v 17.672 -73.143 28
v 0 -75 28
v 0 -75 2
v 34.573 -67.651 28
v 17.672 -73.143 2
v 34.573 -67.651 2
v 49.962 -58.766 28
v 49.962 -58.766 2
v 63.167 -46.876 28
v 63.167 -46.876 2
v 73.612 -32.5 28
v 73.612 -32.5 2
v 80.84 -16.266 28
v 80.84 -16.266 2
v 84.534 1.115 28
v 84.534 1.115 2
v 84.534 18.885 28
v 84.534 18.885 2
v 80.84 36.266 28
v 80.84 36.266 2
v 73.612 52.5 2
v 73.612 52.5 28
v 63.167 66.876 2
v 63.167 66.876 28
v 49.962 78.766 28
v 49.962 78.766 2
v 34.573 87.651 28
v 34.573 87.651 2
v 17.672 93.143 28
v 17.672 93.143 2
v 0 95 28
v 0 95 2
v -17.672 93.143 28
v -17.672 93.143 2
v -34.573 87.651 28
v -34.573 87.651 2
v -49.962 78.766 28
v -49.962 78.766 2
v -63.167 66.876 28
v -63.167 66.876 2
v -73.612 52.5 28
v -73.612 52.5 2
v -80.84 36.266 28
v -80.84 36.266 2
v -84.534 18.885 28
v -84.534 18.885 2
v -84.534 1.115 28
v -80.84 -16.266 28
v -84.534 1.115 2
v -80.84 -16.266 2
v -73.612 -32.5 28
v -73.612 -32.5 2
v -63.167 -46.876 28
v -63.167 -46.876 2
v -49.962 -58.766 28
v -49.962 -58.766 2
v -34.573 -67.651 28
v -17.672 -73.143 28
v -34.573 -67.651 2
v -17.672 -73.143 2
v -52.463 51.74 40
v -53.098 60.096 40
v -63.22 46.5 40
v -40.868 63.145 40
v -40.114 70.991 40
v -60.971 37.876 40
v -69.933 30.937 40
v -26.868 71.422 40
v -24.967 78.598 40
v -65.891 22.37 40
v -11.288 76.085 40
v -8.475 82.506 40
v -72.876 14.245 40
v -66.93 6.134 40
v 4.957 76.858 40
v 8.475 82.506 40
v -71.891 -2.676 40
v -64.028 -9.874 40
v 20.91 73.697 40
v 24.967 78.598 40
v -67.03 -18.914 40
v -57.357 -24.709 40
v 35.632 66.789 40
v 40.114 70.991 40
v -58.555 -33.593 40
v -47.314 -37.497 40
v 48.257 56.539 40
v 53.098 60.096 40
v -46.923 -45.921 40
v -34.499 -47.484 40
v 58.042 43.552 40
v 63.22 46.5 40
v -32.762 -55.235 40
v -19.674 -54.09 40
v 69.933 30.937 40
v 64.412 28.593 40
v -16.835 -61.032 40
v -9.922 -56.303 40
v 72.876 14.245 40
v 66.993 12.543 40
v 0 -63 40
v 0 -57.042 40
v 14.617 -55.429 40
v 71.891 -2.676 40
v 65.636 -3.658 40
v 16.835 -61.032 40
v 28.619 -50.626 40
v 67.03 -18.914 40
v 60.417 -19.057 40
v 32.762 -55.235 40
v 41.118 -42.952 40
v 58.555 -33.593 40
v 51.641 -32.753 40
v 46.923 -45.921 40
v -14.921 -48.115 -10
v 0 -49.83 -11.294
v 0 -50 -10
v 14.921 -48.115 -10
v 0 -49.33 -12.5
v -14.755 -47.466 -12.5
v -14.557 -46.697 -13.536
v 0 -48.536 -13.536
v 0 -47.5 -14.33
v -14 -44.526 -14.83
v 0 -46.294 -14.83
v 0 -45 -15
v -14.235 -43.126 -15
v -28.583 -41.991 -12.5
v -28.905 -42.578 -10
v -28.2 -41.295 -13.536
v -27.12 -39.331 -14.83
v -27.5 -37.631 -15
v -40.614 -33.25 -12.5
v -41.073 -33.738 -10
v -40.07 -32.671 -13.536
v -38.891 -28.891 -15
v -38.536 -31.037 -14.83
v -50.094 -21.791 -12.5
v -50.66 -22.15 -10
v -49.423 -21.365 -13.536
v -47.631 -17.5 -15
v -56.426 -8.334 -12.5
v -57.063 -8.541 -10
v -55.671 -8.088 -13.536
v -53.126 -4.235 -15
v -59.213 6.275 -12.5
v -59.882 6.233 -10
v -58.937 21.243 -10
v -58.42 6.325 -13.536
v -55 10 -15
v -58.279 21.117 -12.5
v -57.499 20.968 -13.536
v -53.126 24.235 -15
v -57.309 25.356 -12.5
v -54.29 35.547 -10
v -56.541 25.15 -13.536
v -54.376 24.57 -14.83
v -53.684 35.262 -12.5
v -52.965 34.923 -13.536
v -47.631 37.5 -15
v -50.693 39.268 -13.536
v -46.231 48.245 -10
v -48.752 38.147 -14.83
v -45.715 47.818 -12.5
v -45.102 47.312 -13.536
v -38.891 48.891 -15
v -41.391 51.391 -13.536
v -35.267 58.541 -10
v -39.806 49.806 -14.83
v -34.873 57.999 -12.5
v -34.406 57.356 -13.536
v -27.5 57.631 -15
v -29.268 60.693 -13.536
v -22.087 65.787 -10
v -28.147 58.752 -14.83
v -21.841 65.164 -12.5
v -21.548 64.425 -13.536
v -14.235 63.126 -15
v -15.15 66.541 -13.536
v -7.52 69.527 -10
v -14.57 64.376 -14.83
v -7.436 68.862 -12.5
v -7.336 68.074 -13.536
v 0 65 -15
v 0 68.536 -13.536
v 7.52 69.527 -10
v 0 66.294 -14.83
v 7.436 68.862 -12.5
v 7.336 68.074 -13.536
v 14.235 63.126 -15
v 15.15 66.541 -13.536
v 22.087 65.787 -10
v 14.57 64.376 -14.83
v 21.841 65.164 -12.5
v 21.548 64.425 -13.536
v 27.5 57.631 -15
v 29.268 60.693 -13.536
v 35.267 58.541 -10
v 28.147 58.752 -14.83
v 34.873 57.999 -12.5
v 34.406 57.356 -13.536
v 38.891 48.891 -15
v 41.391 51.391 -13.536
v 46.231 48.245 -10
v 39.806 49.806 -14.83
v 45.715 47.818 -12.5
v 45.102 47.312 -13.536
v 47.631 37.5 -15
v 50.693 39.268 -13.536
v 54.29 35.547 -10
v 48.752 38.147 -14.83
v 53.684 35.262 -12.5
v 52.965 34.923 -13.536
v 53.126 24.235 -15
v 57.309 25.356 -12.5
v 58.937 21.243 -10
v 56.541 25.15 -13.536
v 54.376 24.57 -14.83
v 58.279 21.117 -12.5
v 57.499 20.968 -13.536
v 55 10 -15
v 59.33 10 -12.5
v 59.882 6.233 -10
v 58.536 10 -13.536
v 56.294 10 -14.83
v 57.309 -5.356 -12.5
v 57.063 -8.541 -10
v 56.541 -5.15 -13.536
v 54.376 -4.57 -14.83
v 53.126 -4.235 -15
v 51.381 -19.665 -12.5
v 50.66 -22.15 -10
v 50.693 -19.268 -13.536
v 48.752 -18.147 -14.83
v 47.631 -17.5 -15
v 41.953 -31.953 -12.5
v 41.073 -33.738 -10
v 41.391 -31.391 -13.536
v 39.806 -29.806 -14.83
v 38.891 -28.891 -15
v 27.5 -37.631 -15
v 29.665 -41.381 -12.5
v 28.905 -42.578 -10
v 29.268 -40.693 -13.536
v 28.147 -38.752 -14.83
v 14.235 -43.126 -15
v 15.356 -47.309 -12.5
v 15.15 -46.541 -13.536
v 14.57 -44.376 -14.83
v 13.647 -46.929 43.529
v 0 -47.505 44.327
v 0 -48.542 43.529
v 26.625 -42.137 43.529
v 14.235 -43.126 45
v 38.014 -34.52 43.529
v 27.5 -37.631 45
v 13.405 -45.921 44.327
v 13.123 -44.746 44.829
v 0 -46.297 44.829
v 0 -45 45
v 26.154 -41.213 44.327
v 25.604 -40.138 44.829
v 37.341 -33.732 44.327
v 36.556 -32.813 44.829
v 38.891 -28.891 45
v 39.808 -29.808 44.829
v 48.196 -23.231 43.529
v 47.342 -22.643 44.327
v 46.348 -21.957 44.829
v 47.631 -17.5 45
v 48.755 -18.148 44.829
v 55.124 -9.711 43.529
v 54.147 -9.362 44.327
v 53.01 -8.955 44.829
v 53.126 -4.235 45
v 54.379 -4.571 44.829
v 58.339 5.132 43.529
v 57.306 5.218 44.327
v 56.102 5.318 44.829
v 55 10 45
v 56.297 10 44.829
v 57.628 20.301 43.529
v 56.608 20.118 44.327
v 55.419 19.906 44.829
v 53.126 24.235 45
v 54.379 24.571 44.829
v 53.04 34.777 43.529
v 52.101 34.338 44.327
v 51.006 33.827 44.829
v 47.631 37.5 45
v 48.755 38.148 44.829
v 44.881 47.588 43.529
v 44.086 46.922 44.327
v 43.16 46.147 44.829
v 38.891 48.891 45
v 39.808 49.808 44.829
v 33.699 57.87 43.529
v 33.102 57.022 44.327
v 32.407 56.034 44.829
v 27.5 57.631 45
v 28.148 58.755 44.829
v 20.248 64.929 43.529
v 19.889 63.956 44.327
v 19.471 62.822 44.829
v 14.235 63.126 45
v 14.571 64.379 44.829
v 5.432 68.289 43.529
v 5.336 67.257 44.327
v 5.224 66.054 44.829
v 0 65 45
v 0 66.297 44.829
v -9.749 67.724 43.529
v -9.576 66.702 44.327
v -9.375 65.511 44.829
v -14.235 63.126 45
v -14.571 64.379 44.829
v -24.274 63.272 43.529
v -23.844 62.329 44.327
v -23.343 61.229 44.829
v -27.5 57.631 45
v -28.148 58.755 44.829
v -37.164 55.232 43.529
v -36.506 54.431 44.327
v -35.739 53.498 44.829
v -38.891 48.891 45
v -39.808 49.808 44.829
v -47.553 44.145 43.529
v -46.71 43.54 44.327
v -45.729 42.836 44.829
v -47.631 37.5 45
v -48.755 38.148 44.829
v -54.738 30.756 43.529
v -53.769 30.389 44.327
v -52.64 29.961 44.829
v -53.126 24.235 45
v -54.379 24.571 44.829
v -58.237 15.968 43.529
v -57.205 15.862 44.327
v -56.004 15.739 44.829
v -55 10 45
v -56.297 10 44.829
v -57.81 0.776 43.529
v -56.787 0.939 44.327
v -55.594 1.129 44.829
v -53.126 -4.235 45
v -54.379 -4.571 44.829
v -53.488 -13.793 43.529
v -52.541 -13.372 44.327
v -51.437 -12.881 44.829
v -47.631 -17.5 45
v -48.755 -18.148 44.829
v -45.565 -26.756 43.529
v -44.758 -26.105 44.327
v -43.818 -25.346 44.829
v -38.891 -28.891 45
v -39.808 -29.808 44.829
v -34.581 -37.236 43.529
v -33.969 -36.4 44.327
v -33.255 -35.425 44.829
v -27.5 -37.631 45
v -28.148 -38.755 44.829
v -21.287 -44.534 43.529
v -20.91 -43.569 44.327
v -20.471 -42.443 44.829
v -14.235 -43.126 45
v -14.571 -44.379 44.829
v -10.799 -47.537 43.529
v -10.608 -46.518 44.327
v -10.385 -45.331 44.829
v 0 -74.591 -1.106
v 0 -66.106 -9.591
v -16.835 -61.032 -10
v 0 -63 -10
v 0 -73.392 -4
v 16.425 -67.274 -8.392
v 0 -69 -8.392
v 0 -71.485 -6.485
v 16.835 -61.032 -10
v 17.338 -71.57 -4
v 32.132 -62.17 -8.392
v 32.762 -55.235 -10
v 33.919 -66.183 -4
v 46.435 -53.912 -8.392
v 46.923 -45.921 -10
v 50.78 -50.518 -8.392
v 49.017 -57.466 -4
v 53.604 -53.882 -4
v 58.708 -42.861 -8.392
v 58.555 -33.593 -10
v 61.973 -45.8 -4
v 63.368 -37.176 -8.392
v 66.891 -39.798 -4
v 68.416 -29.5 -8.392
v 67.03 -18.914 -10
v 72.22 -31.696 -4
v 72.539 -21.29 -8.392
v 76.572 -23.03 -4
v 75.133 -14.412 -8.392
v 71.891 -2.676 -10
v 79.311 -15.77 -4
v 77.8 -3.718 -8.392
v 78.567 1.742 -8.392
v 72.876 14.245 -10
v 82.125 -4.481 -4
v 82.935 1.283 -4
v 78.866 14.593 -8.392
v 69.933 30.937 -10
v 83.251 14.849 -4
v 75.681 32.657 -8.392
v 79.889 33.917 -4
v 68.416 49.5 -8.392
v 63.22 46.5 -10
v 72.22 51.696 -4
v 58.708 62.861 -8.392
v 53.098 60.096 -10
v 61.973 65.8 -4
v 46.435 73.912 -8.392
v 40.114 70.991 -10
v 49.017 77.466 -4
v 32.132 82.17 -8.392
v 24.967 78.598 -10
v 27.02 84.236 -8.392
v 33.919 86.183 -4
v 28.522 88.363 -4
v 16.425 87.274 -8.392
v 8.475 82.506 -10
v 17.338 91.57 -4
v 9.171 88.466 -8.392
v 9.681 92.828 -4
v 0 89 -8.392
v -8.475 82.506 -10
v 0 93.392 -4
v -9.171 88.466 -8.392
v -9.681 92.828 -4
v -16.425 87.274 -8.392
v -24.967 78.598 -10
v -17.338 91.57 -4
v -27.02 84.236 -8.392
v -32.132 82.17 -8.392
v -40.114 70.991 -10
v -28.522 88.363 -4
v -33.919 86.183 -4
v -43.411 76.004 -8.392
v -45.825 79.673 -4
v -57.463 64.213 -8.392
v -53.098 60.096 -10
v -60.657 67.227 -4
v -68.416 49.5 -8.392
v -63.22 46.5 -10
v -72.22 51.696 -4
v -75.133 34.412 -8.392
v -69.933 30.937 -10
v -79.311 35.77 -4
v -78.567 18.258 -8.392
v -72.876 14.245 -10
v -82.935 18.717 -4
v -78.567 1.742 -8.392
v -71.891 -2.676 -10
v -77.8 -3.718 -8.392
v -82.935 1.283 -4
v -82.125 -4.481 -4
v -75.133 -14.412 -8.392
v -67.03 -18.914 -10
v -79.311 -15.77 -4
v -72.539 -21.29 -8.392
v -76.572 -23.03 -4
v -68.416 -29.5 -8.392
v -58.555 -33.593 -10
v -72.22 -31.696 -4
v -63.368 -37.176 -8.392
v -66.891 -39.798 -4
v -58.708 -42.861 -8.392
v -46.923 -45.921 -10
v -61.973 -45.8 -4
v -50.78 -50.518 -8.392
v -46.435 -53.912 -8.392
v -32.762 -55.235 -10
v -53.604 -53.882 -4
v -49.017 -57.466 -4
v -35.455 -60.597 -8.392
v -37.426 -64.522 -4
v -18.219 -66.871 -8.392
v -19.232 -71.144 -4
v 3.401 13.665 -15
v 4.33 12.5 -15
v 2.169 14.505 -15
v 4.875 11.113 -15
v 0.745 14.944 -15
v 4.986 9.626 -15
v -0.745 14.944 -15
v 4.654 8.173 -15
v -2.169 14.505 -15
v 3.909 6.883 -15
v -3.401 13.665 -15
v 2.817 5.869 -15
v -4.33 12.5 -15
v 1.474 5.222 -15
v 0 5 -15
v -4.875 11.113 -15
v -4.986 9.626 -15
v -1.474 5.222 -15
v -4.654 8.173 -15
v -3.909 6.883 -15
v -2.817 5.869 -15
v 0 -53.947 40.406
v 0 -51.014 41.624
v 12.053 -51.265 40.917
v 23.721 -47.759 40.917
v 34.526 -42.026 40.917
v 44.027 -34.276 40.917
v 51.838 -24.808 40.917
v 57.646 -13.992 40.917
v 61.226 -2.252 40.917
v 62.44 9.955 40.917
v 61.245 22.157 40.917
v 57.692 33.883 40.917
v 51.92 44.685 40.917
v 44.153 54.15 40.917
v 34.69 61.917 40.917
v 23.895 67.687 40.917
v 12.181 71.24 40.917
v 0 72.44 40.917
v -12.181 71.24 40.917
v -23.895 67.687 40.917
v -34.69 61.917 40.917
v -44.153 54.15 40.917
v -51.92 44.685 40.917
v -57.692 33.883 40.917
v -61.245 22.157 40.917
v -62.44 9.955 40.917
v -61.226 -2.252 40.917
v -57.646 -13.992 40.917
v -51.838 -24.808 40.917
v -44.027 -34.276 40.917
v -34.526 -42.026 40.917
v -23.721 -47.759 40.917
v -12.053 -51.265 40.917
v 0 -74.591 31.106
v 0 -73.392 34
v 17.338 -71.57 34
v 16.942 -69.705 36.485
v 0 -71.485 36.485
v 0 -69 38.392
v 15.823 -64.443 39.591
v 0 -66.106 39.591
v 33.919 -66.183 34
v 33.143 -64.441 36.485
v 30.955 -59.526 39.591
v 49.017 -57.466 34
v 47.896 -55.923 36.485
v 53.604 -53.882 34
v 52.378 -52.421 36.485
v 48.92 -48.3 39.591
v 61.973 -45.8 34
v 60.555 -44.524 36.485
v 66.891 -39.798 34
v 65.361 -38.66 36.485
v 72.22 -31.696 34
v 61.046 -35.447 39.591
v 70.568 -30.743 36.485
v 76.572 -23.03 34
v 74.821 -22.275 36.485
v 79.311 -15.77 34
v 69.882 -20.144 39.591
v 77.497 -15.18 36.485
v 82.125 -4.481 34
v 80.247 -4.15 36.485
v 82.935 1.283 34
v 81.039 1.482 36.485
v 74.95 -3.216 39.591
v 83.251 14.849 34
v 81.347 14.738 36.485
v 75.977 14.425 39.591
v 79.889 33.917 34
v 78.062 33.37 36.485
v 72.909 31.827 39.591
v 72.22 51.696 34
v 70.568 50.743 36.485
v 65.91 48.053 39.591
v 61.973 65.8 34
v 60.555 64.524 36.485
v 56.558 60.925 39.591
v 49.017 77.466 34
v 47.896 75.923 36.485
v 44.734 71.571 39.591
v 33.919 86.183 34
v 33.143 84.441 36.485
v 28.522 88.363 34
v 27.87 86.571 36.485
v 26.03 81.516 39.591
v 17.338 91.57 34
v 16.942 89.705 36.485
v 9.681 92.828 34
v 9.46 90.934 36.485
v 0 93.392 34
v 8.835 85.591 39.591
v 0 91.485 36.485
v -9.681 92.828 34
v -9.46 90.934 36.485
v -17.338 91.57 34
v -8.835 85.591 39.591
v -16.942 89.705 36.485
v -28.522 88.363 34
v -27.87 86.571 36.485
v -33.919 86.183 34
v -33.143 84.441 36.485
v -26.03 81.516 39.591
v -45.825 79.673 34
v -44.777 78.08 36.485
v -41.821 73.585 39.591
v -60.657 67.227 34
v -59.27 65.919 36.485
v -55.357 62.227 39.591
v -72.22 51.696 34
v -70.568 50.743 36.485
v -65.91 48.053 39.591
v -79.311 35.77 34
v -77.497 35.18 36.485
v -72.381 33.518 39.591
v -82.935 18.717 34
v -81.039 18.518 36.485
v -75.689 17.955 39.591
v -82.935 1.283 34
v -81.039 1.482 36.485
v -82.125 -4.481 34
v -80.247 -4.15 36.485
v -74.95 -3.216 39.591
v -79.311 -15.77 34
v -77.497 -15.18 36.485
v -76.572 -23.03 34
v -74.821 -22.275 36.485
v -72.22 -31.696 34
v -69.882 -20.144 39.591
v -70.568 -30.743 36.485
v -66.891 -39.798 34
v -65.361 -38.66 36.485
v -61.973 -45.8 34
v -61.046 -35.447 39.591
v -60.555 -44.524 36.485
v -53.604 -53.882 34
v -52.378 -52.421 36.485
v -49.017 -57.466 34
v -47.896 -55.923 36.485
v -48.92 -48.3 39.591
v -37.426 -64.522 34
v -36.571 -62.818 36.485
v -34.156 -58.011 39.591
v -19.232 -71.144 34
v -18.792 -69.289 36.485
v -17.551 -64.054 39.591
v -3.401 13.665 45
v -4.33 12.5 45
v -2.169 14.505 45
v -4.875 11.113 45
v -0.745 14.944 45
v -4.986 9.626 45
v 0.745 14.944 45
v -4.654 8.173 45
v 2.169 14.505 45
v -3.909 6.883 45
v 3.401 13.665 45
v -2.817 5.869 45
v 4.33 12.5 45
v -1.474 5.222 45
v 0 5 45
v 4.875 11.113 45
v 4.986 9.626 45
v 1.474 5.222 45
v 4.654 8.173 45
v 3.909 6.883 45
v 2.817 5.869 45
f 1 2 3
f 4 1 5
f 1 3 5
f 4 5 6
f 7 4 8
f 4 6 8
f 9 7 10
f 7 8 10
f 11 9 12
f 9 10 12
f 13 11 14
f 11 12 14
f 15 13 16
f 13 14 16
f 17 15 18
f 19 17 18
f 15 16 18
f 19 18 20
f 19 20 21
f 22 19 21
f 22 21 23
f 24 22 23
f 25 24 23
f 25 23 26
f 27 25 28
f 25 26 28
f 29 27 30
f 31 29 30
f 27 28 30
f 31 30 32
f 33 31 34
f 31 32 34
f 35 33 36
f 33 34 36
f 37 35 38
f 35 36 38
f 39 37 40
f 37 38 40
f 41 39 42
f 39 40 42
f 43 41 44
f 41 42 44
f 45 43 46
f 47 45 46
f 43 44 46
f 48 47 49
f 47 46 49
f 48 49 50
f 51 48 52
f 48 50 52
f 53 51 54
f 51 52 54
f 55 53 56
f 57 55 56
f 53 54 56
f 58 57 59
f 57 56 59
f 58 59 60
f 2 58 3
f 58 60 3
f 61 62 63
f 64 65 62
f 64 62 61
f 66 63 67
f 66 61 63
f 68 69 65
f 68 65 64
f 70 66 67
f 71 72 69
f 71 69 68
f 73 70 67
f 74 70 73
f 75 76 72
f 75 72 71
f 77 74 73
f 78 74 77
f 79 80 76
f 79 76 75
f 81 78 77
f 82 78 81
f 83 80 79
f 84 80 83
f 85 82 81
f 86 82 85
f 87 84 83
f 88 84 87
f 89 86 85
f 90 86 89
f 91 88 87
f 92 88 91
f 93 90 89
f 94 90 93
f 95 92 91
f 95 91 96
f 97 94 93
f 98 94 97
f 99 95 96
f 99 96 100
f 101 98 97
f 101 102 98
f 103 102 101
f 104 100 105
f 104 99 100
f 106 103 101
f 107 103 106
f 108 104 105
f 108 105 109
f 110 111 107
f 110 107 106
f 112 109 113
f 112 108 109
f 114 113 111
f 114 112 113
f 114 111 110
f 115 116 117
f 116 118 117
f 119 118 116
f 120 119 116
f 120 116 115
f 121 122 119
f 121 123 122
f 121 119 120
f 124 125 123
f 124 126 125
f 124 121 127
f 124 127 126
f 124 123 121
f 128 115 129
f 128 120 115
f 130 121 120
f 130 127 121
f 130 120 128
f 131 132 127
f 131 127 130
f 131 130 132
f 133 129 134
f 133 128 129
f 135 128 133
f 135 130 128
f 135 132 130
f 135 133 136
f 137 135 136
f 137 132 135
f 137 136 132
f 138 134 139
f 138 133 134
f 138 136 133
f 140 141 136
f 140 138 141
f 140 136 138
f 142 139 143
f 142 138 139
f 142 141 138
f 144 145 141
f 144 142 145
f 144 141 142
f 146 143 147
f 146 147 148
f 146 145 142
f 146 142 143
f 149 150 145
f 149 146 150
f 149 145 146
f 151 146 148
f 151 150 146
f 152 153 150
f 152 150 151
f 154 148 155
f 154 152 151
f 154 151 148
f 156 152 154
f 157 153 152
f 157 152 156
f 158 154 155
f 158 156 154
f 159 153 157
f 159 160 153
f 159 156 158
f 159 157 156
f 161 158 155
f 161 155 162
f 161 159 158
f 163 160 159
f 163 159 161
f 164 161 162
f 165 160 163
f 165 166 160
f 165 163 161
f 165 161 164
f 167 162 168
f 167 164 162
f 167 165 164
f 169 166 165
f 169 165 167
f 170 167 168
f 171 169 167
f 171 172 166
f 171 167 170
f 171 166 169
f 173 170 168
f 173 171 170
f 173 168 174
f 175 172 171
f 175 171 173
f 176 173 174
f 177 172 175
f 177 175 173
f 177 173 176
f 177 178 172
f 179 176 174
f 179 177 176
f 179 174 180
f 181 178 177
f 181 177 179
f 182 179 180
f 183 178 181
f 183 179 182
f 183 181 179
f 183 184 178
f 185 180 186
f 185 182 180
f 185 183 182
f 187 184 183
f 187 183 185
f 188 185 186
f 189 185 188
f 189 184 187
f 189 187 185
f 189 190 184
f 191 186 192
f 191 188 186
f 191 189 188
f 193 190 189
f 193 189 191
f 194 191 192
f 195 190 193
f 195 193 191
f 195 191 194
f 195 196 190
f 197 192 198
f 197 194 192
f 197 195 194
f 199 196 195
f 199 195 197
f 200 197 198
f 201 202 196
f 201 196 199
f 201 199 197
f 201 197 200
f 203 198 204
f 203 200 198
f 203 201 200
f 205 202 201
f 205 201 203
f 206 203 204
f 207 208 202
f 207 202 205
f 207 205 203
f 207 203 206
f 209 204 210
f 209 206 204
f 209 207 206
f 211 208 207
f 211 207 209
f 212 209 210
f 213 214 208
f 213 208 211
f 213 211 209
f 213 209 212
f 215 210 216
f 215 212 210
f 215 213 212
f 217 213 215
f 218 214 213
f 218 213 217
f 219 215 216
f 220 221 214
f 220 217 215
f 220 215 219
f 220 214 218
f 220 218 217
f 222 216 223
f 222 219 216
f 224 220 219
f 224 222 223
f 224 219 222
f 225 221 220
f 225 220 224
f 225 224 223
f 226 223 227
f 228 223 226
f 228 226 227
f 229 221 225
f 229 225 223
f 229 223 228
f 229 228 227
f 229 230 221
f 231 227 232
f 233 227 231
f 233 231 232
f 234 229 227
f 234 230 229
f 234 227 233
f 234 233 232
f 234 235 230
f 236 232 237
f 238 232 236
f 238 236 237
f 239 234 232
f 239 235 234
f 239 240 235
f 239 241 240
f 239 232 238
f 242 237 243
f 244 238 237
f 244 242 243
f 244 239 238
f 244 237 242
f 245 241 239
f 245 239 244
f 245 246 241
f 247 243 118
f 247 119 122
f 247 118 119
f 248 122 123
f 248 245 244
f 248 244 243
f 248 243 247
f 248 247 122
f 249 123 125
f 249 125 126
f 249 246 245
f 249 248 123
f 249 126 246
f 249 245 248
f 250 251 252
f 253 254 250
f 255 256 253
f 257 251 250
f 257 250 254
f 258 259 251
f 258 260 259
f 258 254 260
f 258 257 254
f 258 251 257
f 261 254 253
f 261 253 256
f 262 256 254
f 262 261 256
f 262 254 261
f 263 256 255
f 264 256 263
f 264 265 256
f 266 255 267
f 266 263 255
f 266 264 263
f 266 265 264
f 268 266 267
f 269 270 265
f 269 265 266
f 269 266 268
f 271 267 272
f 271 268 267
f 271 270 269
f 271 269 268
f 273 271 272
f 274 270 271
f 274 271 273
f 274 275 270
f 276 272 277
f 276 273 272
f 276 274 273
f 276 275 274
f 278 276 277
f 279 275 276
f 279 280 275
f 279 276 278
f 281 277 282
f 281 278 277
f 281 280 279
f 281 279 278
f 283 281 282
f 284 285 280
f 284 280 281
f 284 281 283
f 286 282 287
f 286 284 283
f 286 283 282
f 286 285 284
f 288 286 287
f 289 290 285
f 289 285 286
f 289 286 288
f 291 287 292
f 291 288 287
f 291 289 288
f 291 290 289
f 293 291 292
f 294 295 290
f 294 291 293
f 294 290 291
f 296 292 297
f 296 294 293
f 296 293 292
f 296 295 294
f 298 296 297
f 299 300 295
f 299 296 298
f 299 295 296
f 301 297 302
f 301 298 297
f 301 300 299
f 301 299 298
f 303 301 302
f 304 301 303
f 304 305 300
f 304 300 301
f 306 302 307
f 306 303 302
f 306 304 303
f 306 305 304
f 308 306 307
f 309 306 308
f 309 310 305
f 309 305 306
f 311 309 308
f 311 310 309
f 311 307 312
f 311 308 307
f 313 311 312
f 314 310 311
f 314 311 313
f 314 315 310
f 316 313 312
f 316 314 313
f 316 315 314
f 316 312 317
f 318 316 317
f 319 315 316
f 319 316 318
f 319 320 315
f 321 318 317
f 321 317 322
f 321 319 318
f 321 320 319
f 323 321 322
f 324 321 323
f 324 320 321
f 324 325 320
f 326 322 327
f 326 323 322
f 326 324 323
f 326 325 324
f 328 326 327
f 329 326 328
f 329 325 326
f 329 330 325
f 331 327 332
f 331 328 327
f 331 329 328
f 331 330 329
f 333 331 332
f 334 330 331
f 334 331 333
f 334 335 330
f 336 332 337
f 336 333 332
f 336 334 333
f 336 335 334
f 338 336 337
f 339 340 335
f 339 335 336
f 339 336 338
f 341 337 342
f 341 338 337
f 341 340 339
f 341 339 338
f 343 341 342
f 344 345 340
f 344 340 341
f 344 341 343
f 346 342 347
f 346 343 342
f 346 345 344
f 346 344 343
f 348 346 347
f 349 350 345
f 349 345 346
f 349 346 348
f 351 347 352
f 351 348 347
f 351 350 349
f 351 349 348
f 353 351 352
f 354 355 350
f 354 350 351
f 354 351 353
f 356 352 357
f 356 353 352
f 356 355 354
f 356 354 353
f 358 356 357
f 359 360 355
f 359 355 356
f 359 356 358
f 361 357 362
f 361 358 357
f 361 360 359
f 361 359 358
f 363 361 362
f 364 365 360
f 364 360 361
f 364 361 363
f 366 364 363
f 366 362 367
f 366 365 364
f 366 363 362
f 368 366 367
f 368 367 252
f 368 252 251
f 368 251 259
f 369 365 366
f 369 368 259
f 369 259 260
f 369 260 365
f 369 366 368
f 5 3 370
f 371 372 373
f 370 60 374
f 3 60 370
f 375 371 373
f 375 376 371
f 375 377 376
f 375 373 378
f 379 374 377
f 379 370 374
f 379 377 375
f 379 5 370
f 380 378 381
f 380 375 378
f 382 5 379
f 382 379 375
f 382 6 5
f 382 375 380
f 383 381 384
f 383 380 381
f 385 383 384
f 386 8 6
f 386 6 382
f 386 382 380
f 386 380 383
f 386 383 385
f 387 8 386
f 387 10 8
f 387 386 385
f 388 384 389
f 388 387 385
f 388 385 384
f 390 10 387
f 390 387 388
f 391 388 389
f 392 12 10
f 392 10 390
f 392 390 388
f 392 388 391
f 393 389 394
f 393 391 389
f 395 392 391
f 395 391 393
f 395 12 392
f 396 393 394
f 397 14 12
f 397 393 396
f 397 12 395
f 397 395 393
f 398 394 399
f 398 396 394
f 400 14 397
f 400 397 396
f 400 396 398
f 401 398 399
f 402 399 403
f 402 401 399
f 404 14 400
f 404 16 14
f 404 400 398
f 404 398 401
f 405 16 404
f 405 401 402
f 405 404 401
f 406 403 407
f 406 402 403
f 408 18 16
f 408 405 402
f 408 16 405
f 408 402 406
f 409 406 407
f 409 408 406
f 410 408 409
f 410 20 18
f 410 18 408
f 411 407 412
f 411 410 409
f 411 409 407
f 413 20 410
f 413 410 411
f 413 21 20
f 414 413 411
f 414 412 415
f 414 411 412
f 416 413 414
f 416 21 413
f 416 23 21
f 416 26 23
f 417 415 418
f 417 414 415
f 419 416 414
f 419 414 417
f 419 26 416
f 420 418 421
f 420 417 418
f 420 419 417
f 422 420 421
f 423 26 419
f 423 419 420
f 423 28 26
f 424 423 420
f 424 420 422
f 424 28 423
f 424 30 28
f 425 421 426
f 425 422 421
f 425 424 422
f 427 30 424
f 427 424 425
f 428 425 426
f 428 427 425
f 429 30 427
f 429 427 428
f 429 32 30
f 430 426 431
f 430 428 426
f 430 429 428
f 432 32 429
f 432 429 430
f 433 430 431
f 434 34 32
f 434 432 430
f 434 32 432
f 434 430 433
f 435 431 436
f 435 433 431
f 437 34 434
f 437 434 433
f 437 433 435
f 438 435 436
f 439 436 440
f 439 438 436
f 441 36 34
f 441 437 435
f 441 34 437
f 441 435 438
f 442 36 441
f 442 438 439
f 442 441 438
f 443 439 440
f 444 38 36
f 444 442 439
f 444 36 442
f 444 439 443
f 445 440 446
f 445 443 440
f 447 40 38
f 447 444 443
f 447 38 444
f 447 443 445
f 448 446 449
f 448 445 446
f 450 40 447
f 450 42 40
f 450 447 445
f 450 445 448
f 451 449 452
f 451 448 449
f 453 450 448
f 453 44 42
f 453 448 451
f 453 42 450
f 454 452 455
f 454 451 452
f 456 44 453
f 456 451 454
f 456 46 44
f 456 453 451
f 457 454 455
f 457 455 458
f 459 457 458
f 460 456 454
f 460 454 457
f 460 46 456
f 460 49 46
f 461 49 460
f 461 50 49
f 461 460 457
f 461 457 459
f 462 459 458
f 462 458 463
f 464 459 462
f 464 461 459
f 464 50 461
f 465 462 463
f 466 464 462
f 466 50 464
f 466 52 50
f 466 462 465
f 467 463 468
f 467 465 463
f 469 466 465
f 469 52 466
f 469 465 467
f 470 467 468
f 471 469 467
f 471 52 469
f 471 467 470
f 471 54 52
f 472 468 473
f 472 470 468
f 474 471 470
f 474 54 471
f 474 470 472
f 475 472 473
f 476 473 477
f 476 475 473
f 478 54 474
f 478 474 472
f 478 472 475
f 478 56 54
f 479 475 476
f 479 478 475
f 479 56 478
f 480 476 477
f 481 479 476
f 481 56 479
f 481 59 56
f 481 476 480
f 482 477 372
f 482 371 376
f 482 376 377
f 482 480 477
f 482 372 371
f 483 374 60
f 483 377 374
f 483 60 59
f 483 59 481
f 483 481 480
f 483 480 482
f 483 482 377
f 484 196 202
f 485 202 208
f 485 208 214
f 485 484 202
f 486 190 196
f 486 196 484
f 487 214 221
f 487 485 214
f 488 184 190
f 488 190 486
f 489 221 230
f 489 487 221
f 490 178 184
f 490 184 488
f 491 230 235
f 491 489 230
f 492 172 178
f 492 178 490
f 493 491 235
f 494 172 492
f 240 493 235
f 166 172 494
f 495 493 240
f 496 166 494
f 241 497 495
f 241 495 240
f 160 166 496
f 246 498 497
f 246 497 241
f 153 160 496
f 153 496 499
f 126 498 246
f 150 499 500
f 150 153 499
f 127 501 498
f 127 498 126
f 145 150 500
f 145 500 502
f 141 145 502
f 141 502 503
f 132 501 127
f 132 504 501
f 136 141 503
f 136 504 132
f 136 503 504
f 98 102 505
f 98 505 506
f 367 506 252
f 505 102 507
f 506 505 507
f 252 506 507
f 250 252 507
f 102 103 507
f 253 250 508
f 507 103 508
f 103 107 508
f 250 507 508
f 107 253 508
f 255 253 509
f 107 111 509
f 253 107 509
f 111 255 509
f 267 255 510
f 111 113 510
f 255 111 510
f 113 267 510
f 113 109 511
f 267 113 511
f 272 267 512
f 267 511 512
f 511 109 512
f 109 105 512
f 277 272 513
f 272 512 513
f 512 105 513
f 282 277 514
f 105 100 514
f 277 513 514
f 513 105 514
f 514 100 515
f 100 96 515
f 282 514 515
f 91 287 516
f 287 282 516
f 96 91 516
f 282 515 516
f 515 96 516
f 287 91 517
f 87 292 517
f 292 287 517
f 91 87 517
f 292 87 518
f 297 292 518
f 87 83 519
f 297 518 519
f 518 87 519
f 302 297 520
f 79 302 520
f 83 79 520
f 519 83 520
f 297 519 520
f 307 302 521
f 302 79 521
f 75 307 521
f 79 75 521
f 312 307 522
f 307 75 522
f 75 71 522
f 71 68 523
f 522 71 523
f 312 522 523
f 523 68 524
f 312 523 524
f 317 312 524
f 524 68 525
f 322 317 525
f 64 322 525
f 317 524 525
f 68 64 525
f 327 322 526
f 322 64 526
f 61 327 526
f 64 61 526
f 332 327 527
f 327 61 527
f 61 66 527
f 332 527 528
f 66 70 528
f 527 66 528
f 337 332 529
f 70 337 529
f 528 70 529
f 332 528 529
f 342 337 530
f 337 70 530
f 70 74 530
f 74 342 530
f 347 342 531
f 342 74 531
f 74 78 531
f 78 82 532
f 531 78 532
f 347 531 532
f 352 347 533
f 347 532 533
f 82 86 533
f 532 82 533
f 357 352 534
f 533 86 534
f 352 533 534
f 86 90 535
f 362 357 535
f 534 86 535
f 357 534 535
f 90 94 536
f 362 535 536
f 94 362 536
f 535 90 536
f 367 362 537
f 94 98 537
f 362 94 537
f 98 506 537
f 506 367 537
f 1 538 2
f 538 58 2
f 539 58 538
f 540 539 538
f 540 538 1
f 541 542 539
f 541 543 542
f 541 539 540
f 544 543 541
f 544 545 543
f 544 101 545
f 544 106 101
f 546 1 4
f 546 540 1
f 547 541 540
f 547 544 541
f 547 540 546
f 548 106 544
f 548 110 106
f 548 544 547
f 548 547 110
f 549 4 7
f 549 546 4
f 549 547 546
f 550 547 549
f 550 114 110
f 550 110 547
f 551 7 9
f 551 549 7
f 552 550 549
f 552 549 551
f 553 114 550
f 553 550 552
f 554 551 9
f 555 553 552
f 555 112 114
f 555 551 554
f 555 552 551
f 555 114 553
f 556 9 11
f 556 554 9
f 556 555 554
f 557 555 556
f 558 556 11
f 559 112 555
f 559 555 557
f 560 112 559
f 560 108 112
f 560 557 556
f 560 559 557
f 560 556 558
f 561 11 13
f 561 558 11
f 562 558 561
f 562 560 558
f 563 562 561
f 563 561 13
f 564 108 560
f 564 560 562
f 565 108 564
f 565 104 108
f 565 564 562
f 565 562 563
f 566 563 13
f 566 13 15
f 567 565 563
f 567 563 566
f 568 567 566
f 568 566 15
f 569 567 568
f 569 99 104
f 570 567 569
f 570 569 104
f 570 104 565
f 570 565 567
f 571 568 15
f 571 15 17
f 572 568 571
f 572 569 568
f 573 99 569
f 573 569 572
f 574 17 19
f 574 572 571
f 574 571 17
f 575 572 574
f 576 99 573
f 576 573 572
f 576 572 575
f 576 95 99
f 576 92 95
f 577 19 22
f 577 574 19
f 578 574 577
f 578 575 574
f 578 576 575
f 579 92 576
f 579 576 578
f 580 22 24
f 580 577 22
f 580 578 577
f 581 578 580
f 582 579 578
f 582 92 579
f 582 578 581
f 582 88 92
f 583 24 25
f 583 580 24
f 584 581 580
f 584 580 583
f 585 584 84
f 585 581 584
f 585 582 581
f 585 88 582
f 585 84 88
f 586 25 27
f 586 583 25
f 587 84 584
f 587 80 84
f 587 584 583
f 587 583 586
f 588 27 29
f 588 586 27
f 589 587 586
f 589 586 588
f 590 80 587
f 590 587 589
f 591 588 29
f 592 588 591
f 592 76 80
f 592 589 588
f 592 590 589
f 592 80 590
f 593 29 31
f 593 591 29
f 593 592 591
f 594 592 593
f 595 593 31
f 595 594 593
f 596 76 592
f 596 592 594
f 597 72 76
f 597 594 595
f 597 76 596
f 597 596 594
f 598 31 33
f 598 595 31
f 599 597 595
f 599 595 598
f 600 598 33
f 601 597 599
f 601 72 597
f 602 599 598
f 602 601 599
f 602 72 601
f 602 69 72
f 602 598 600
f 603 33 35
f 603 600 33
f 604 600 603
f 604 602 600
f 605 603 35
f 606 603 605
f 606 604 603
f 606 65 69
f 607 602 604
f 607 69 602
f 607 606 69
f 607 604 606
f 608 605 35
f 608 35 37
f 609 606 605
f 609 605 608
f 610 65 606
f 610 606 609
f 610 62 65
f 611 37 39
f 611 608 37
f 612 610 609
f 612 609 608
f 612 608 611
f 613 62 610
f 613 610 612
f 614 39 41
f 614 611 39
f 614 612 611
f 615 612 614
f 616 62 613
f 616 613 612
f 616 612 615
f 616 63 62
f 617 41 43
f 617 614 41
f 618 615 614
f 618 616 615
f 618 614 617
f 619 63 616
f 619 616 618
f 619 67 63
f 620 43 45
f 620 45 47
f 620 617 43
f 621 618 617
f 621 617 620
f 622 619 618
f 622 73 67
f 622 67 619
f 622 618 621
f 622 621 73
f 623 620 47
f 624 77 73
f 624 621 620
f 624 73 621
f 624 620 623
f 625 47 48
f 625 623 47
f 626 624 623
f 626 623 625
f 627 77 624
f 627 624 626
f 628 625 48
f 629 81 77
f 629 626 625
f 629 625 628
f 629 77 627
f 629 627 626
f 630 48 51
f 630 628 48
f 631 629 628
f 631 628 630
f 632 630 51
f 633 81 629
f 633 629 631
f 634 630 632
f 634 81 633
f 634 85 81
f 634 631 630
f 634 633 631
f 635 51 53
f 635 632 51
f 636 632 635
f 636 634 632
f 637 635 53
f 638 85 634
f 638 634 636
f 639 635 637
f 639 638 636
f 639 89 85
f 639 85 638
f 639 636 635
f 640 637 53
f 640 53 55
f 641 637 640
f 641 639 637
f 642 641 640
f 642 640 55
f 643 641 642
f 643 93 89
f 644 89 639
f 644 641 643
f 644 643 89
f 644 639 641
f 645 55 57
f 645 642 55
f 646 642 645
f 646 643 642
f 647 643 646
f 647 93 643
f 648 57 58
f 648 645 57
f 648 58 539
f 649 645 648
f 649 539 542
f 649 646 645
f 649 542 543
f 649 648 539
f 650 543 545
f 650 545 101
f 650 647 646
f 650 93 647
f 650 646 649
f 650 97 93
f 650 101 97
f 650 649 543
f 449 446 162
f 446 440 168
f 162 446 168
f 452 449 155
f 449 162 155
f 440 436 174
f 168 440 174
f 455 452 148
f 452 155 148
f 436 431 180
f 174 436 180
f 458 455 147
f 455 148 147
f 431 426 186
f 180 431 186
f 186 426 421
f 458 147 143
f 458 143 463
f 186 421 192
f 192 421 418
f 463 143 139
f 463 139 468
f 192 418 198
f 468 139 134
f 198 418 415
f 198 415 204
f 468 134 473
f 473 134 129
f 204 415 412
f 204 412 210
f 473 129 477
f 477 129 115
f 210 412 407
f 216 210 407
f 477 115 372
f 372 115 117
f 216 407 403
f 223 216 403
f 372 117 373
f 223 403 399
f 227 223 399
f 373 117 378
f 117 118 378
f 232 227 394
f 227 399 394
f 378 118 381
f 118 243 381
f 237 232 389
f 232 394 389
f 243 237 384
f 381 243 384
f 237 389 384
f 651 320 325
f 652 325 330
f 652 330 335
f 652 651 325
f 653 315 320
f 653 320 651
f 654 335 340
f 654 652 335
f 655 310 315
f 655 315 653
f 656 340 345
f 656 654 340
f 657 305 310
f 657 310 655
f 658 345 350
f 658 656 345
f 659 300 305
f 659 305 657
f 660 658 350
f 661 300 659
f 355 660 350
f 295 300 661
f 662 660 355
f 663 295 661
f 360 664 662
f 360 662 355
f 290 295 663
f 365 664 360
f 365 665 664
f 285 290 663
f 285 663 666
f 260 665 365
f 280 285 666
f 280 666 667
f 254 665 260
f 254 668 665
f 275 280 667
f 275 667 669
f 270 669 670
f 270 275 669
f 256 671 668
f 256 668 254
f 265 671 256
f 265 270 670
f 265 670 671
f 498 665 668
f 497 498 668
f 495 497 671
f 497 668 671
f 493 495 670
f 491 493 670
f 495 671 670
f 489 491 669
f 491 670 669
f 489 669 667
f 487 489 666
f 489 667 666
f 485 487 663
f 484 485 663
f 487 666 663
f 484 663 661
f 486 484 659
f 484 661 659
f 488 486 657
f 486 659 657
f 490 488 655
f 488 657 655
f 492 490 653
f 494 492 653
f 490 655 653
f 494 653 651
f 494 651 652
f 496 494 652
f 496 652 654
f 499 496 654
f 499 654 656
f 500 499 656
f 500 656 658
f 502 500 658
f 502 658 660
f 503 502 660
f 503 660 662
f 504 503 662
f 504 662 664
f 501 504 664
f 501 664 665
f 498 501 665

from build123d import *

# Parameters (mm, degrees)
SKETCH2_R             = 85
BOSS_EXTRUDE1_DEPTH   = 50
SKETCH3_R             = 60
BOSS_EXTRUDE2_DEPTH   = 5
BOSS_EXTRUDE3_START   = 5
SKETCH4_R             = 60
BOSS_EXTRUDE3_DEPTH   = 5
SKETCH5_R             = 5
CUT_EXTRUDE1_DEPTH    = 100
BODY_MOVE_COPY1_ANGLE = 90
FILLET1_R             = 5
FILLET2_R             = 12


with BuildPart() as part:
    # Sketch2 → Boss-Extrude1 (new body)
    with BuildSketch(Plane(origin=(0, 0, 0), x_dir=(1, 0, 0), z_dir=(0, 1, 0))):
        with Locations(Location((0, 0, 0), (0, 0, 270))):
            Circle(SKETCH2_R)
    extrude(amount=BOSS_EXTRUDE1_DEPTH)

    # Sketch3 → Boss-Extrude2 (add)
    with BuildSketch(Plane(origin=(0, 50, 0), x_dir=(1, 0, 0), z_dir=(0, 1, 0))):
        with Locations(Location((0, 0, 0), (0, 0, 270))):
            Circle(SKETCH3_R)
    extrude(amount=BOSS_EXTRUDE2_DEPTH)

    # Sketch4 → Boss-Extrude3 (add)
    with BuildSketch(Plane.XZ.offset(BOSS_EXTRUDE3_START)):
        with Locations(Location((0, 0, 0), (0, 0, 90))):
            Circle(SKETCH4_R)
    extrude(amount=-BOSS_EXTRUDE3_DEPTH)

    # Sketch5 → Cut-Extrude1 (cut)
    with BuildSketch(Plane(origin=(0, 55, 0), x_dir=(1, 0, 0), z_dir=(0, 1, 0))):
        with Locations(Location((0, 0, 0), (0, 0, 270))):
            Circle(SKETCH5_R)
    extrude(amount=-CUT_EXTRUDE1_DEPTH, mode=Mode.SUBTRACT)


with BuildPart() as part_1:
    # Body-Move/Copy1: moved
    add(part.part.rotate(Axis((0, 10, 0), (1, 0, 0)), BODY_MOVE_COPY1_ANGLE))

    # Fillet1
    fillet1_edges = [part_1.edges().sort_by_distance(p)[0] for p in [
        (0, 70, -15),
        (0, 70, 45),
    ]]
    fillet(fillet1_edges, radius=FILLET1_R - 0.0001)  # a hair under: the kernel refuses the full size

    # Fillet2
    fillet2_edges = [part_1.edges().sort_by_distance(p)[0] for p in [
        (0, 95, -10),
        (0, 95, 40),
        (0, 70, 40),
    ]]
    fillet(fillet2_edges, radius=FILLET2_R)


solid = part_1.part
